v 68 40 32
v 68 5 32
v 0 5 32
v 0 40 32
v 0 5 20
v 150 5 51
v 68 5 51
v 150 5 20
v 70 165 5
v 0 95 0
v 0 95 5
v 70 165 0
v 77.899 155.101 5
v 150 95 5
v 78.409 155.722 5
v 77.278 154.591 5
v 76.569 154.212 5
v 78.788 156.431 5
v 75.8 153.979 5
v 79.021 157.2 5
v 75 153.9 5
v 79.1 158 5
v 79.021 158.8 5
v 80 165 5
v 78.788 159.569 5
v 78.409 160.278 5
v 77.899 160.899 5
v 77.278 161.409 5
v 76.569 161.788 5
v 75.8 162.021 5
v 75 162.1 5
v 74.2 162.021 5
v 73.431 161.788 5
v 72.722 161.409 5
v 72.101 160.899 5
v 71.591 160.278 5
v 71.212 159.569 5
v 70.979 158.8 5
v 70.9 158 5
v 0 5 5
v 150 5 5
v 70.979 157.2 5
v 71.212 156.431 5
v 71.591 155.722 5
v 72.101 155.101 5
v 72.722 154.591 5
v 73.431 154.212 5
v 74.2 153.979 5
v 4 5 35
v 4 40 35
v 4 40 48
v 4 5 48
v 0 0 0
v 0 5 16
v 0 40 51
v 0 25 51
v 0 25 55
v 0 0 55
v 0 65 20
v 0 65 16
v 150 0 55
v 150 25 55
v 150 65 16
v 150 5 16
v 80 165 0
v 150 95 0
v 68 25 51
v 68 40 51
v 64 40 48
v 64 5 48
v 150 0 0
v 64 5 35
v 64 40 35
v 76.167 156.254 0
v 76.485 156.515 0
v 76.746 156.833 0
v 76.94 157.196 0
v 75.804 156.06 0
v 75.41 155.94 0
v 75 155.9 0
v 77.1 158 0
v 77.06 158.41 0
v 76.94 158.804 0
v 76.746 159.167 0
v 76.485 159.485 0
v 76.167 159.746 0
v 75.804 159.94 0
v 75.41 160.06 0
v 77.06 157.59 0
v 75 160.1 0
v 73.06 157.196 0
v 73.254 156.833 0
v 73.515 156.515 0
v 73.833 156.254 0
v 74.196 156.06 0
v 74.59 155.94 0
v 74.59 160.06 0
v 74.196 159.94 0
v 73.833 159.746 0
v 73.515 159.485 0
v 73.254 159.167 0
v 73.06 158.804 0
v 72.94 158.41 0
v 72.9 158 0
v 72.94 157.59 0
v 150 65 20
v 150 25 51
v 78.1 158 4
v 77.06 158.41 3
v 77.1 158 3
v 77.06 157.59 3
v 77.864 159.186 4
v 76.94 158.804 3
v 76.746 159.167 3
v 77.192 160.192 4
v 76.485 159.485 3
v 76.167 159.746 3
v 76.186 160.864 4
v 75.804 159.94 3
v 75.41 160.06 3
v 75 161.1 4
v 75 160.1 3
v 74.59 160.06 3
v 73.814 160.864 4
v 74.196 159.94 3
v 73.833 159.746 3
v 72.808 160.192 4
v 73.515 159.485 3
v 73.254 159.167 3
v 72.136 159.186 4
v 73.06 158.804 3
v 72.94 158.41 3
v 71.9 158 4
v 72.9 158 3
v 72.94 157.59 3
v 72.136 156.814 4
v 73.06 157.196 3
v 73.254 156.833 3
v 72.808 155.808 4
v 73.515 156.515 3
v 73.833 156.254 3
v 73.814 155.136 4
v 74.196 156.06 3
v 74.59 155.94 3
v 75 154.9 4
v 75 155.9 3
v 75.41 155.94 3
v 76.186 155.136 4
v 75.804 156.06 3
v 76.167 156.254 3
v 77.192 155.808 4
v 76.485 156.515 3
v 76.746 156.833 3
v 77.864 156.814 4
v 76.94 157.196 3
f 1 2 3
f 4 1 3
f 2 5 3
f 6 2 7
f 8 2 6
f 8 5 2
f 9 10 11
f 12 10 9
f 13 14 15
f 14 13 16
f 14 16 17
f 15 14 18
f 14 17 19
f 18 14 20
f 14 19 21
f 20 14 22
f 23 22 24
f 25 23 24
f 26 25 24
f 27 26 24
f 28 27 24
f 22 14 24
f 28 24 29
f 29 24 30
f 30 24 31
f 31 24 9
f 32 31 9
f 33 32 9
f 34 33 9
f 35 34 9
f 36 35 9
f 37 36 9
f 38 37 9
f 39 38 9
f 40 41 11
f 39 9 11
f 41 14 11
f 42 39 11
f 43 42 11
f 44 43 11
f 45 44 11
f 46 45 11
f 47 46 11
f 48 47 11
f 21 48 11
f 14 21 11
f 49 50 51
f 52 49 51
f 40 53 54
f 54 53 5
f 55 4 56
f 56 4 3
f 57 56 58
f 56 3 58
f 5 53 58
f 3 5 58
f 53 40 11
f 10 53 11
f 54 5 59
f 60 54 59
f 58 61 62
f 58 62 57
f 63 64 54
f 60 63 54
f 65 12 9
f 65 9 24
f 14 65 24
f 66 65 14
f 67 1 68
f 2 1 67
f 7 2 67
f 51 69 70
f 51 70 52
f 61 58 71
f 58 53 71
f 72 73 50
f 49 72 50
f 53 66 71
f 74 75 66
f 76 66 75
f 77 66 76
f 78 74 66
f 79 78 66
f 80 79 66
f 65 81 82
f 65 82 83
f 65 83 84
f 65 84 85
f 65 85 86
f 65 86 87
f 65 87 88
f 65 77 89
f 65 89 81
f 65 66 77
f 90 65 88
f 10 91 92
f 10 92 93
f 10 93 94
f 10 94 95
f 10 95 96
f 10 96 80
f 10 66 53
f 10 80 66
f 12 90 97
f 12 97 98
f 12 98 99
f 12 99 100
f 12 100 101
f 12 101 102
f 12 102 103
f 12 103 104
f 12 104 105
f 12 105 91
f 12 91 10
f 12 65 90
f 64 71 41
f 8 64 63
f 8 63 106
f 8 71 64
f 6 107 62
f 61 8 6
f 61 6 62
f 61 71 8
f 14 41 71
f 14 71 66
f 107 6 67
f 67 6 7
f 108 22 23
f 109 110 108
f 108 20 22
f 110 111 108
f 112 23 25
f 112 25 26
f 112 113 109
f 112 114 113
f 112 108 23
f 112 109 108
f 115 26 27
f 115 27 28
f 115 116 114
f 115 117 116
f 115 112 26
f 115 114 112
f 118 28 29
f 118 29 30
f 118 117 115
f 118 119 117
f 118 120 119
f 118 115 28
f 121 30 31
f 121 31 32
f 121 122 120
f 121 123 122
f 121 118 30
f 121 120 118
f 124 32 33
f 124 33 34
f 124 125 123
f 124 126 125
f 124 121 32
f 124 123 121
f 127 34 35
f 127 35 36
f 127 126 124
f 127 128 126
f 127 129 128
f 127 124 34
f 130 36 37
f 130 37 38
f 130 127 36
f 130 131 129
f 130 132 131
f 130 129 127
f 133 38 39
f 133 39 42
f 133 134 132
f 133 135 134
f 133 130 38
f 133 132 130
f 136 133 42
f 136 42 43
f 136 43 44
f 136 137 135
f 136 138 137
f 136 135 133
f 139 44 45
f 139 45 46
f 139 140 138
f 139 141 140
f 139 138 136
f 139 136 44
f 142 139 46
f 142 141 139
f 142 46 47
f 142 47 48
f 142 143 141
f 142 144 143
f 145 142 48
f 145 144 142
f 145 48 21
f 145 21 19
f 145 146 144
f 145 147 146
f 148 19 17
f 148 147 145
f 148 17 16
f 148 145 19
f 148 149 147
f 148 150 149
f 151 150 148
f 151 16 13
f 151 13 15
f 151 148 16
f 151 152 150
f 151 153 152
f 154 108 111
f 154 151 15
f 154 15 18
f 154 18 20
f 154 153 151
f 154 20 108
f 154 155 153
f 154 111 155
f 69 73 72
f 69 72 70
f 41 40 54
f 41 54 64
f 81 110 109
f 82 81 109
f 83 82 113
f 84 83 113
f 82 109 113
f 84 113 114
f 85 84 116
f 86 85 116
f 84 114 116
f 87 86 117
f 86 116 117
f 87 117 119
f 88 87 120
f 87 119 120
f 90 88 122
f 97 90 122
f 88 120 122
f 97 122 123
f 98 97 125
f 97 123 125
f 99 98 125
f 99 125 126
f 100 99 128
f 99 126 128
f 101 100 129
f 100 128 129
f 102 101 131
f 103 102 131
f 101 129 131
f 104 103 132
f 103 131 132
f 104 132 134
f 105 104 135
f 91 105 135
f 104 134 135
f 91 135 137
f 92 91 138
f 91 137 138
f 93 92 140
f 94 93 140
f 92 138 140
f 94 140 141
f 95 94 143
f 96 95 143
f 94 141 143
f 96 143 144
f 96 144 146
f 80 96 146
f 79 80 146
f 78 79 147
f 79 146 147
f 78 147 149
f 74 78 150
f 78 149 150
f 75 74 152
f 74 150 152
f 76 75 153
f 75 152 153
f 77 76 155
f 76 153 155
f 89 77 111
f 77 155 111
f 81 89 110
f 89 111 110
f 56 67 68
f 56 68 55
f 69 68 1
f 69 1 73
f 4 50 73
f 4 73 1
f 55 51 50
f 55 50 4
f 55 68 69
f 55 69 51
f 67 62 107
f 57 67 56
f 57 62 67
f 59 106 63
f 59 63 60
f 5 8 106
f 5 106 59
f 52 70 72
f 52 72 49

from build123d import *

# Parameters (mm, degrees)
PAD_DEPTH       = 5
SKETCH001_W     = 150
SKETCH001_H     = 5
PAD001_DEPTH    = 50
SKETCH002_W     = 150
SKETCH002_H     = 4
PAD002_DEPTH    = 60
SKETCH003_W     = 150
SKETCH003_H     = 4
PAD003_DEPTH    = 20
SKETCH004_W     = 68
SKETCH004_H     = 19
PAD004_DEPTH    = 35
SKETCH005_W     = 60
SKETCH005_H     = 13
POCKET_DEPTH    = 35
SKETCH006_R     = 2.1
POCKET001_DEPTH = 5
CHAMFER_SIZE    = 2


with BuildPart() as part:
    # Sketch → Pad (new body)
    with BuildSketch(Plane.XY):
        Polygon((0, 0), (0, 95), (70, 165), (80, 165), (150, 95), (150, 0), align=None)
    extrude(amount=PAD_DEPTH)

    # Sketch001 (on Face8 of Pad) → Pad001 (join)
    with BuildSketch(Plane.XY.offset(5)):
        with Locations((75, 2.5)):
            Rectangle(SKETCH001_W, SKETCH001_H)
    extrude(amount=PAD001_DEPTH)

    # Sketch002 (on Face11 of Pad001) → Pad002 (join)
    with BuildSketch(Plane(origin=(0, 5, 0), x_dir=(-1, 0, 0), z_dir=(0, 1, 0))):
        with Locations((-75, 18)):
            Rectangle(SKETCH002_W, SKETCH002_H)
    extrude(amount=PAD002_DEPTH)

    # Sketch003 (on Face10 of Pad002) → Pad003 (join)
    with BuildSketch(Plane(origin=(0, 5, 0), x_dir=(-1, 0, 0), z_dir=(0, 1, 0))):
        with Locations((-75, 53)):
            Rectangle(SKETCH003_W, SKETCH003_H)
    extrude(amount=PAD003_DEPTH)

    # Sketch004 (on Face10 of Pad003) → Pad004 (join)
    with BuildSketch(Plane(origin=(0, 5, 0), x_dir=(-1, 0, 0), z_dir=(0, 1, 0))):
        with Locations((-34, 41.5)):
            Rectangle(SKETCH004_W, SKETCH004_H)
    extrude(amount=PAD004_DEPTH)

    # Sketch005 (on Face23 of Pad004) → Pocket (cut)
    with BuildSketch(Plane(origin=(0, 40, 0), x_dir=(-1, 0, 0), z_dir=(0, 1, 0))):
        with Locations((-34, 41.5)):
            Rectangle(SKETCH005_W, SKETCH005_H)
    extrude(amount=-POCKET_DEPTH, mode=Mode.SUBTRACT)

    # Sketch006 (on Face5 of Pocket) → Pocket001 (cut)
    with BuildSketch(Plane.XY.offset(5)):
        with Locations((75, 158)):
            Circle(SKETCH006_R)
    extrude(amount=-POCKET001_DEPTH, mode=Mode.SUBTRACT)

    # Chamfer
    chamfer_edges = [part.edges().sort_by_distance(p)[0] for p in [
        (72.9, 158, 5),
    ]]
    chamfer(chamfer_edges, length=CHAMFER_SIZE)


solid = part.part
